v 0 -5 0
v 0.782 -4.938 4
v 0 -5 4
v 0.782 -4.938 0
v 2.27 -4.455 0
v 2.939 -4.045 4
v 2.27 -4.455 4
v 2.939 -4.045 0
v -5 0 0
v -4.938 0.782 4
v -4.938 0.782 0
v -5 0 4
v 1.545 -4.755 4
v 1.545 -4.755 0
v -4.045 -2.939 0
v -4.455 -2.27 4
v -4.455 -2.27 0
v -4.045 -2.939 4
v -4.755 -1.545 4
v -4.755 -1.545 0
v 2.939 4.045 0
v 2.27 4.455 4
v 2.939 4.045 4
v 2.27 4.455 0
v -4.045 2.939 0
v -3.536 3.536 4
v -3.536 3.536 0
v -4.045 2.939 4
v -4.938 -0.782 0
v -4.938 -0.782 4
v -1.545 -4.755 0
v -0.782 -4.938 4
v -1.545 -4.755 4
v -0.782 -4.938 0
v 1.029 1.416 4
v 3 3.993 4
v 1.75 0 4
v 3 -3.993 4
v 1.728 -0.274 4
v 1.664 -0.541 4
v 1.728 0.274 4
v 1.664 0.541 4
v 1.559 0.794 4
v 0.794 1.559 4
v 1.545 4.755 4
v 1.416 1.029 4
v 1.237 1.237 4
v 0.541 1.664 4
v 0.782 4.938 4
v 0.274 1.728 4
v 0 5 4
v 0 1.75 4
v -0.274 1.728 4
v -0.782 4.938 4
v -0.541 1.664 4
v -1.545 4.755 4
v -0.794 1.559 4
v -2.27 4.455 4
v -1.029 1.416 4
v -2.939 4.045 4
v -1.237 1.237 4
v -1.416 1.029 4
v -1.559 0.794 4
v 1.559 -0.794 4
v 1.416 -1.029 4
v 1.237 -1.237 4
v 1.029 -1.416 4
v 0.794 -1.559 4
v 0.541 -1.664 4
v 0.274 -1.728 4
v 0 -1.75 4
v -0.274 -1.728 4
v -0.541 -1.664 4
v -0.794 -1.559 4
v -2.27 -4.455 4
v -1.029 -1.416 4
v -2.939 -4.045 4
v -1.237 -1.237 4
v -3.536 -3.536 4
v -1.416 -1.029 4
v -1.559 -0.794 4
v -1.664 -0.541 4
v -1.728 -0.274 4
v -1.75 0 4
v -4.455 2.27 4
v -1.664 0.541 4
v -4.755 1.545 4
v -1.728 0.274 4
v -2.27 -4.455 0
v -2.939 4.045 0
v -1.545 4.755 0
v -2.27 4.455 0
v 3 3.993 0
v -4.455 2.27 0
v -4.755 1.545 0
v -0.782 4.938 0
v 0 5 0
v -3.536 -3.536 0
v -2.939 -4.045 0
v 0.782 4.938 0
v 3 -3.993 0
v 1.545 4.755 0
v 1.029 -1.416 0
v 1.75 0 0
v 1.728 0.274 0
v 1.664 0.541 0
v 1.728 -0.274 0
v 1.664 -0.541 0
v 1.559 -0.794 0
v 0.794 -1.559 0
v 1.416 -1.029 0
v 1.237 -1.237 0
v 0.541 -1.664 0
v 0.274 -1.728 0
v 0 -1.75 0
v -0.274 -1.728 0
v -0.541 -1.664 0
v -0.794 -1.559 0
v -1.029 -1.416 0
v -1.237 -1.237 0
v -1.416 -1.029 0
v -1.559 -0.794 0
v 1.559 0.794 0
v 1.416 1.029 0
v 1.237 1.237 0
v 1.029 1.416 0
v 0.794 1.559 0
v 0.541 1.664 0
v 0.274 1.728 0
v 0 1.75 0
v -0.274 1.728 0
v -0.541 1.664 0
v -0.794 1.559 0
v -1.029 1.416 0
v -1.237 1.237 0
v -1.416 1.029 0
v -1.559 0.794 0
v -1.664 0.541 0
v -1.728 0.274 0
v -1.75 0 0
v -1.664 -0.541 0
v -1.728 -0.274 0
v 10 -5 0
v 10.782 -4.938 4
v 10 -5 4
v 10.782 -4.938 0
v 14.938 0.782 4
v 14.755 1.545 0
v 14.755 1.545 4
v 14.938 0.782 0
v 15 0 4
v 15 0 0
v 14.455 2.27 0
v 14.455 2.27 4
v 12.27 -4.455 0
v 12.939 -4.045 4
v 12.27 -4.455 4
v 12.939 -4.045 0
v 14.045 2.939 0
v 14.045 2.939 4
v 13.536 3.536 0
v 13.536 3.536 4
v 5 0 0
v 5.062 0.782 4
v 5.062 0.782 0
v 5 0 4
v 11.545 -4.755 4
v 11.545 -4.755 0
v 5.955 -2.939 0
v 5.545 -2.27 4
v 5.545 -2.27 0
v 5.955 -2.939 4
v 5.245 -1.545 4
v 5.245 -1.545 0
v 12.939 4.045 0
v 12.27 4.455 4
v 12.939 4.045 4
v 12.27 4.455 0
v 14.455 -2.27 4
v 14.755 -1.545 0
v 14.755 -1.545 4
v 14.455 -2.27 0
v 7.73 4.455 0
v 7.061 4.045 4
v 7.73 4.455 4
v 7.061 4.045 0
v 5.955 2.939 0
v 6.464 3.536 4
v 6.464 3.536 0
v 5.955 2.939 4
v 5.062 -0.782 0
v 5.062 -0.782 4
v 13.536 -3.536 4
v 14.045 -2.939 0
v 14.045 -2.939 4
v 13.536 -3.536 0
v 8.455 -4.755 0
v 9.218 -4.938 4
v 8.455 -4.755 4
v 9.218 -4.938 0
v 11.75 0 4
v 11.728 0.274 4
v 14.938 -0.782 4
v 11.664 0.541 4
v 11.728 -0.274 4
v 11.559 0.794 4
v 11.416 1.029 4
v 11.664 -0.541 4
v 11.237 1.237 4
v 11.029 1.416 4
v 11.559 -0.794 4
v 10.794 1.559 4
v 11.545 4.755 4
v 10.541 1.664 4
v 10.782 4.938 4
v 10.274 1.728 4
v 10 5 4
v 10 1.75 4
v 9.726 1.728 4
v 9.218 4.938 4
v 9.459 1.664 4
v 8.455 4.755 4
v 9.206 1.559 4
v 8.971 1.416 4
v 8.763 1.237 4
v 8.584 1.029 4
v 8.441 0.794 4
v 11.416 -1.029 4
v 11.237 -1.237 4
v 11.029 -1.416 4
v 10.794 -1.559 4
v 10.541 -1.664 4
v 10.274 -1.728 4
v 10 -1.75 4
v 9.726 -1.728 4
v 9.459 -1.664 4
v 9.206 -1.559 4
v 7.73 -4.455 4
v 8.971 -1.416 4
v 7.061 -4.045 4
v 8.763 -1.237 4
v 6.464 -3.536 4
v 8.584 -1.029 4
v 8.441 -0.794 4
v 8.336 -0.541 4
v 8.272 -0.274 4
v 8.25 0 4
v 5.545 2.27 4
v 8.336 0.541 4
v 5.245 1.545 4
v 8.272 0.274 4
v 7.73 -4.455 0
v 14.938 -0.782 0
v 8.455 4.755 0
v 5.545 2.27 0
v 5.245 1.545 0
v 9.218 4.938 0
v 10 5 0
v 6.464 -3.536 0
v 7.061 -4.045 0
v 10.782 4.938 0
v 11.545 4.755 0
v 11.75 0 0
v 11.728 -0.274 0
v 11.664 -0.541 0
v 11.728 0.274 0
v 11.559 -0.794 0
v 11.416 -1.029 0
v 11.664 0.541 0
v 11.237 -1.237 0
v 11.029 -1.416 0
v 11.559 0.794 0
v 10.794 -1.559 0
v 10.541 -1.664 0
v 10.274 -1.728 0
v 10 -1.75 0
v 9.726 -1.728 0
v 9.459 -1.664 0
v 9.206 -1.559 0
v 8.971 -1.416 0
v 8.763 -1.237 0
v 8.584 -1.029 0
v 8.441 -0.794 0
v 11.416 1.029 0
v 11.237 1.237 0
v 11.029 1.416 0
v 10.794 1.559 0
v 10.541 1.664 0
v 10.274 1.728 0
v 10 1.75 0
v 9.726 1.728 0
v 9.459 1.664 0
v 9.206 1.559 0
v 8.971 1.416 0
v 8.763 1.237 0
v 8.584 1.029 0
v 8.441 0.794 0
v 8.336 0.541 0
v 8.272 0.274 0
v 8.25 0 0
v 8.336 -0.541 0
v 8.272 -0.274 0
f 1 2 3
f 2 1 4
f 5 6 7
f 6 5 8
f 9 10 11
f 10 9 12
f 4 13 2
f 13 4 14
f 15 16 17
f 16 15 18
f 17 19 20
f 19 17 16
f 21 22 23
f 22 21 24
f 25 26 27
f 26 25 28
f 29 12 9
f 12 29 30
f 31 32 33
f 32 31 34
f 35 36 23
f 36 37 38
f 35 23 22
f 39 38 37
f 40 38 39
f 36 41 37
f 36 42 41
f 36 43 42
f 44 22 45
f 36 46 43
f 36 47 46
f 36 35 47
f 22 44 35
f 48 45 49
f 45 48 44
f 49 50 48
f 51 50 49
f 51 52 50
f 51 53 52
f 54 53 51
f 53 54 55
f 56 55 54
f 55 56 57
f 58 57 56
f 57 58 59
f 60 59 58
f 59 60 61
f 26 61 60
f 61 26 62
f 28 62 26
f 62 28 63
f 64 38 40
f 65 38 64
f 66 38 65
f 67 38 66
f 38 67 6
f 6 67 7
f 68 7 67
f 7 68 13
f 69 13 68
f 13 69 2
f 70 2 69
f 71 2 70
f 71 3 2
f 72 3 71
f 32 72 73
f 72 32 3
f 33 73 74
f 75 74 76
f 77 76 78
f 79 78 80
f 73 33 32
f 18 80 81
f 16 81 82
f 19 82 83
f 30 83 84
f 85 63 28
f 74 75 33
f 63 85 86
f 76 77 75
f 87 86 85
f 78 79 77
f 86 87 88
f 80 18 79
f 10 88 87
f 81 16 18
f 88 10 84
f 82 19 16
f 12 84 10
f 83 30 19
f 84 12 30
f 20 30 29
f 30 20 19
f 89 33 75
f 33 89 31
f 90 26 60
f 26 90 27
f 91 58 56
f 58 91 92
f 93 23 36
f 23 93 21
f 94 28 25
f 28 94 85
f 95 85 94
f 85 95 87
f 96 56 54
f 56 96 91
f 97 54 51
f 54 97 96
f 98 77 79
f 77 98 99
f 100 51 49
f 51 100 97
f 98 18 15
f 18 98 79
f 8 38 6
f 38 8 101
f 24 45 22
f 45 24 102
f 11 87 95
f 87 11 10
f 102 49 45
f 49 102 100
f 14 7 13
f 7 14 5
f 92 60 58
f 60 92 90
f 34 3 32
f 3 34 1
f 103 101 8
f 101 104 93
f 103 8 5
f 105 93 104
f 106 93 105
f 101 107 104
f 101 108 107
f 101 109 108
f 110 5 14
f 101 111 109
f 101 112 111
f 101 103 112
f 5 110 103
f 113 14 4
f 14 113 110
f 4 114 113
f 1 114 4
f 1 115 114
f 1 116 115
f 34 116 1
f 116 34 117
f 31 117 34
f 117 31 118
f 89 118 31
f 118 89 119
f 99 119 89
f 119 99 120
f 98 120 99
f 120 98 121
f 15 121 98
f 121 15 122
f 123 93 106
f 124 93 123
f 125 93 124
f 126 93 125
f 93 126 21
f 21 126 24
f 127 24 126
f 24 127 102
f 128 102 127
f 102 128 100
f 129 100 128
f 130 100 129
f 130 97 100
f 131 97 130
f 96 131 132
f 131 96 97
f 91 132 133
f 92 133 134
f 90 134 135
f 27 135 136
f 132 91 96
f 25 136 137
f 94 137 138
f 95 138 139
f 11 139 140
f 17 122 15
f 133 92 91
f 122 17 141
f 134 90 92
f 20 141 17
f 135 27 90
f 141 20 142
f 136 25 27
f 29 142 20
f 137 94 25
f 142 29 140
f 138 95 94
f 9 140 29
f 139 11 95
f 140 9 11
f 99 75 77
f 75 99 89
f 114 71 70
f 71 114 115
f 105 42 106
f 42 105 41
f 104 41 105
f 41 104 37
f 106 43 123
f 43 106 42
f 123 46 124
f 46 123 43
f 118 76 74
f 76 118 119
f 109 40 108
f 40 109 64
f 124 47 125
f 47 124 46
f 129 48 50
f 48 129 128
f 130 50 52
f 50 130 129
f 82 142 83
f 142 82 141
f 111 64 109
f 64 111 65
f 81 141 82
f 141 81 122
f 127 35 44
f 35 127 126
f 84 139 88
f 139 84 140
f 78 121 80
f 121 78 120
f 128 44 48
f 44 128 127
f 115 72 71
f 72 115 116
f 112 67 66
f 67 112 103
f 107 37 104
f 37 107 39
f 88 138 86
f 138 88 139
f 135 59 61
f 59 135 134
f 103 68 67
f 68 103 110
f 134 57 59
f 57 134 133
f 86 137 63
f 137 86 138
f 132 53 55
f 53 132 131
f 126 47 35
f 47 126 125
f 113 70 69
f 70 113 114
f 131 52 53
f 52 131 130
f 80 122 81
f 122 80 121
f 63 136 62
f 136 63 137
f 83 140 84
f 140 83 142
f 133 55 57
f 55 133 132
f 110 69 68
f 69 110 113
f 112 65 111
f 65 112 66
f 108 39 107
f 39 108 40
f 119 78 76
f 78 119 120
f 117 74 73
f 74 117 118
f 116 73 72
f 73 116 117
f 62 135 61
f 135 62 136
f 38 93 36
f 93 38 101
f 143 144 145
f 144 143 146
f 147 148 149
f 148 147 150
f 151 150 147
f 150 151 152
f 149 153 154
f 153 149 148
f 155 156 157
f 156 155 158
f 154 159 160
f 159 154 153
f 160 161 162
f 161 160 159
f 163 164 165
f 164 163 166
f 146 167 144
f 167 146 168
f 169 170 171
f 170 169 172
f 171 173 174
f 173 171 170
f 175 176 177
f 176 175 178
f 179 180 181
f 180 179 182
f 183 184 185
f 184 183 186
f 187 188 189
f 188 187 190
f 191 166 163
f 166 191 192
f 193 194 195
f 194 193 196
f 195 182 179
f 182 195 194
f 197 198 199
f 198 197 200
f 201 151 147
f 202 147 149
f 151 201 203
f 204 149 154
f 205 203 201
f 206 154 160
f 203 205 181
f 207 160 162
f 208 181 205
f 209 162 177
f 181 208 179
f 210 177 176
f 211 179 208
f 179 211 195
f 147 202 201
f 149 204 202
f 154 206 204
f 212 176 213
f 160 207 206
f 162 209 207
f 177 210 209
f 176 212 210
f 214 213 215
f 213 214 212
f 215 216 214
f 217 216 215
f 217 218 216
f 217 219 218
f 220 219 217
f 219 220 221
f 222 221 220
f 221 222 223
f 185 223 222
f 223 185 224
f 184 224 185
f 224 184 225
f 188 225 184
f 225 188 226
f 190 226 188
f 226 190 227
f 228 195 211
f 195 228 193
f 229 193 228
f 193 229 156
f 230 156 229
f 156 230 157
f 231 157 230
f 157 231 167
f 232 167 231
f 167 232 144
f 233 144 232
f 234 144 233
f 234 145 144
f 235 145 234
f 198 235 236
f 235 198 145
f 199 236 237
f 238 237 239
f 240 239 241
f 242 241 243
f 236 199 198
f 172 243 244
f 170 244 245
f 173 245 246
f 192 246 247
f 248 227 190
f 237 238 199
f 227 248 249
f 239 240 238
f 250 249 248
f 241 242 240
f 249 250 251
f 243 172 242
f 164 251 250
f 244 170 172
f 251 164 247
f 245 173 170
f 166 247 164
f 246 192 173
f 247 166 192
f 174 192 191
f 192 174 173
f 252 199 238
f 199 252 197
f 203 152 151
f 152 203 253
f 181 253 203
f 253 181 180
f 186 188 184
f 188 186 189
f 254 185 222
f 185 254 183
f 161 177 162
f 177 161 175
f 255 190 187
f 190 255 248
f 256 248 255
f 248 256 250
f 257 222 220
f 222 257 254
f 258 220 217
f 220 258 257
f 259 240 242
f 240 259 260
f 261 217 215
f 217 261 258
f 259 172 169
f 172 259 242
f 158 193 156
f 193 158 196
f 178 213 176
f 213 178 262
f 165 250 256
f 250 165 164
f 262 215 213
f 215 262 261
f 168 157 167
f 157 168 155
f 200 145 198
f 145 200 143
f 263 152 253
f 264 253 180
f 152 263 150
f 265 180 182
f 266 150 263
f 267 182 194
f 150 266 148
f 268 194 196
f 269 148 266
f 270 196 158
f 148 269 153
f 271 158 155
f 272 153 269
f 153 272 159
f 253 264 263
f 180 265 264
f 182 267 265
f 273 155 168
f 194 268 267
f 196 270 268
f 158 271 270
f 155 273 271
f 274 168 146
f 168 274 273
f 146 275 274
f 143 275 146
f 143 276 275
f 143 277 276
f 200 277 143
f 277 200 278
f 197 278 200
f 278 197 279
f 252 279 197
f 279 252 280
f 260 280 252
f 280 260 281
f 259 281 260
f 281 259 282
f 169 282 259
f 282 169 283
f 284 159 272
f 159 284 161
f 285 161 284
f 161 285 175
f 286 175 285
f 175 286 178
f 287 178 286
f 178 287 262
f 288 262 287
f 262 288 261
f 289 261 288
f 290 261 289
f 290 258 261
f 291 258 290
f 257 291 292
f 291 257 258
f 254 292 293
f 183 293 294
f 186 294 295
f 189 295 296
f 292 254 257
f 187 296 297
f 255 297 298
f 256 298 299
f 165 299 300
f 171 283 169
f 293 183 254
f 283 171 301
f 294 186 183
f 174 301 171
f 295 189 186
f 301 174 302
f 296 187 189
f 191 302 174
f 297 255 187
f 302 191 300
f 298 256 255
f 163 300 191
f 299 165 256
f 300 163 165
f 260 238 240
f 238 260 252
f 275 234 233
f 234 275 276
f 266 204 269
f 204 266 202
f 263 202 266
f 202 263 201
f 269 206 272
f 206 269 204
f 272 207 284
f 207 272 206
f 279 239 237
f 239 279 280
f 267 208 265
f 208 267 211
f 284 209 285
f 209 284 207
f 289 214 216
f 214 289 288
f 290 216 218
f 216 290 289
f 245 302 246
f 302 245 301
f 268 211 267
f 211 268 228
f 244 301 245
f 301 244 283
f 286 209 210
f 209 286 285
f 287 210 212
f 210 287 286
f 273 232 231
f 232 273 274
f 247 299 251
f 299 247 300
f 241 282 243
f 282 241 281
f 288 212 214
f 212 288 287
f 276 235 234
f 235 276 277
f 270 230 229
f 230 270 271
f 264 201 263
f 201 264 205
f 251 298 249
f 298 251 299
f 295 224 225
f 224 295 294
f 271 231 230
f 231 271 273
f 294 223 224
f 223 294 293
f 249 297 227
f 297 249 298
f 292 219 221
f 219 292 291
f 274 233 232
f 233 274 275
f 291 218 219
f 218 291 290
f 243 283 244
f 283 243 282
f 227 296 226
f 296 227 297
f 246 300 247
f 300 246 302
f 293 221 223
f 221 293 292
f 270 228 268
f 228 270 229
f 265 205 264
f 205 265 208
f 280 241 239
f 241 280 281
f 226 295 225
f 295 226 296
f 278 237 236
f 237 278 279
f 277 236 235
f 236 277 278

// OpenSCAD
$fn=40;

difference () {
    cylinder (4, r=5);
    translate ([0, 0, -1]) cylinder (6, r=3/2+.25);
    translate ([3, -5, -1]) cube ([10, 10, 10]);
}

translate ([10, 0, 0]) difference () {
    cylinder (4, r=5);
    translate ([0, 0, -1]) cylinder (6, r=3/2+.25);
}
